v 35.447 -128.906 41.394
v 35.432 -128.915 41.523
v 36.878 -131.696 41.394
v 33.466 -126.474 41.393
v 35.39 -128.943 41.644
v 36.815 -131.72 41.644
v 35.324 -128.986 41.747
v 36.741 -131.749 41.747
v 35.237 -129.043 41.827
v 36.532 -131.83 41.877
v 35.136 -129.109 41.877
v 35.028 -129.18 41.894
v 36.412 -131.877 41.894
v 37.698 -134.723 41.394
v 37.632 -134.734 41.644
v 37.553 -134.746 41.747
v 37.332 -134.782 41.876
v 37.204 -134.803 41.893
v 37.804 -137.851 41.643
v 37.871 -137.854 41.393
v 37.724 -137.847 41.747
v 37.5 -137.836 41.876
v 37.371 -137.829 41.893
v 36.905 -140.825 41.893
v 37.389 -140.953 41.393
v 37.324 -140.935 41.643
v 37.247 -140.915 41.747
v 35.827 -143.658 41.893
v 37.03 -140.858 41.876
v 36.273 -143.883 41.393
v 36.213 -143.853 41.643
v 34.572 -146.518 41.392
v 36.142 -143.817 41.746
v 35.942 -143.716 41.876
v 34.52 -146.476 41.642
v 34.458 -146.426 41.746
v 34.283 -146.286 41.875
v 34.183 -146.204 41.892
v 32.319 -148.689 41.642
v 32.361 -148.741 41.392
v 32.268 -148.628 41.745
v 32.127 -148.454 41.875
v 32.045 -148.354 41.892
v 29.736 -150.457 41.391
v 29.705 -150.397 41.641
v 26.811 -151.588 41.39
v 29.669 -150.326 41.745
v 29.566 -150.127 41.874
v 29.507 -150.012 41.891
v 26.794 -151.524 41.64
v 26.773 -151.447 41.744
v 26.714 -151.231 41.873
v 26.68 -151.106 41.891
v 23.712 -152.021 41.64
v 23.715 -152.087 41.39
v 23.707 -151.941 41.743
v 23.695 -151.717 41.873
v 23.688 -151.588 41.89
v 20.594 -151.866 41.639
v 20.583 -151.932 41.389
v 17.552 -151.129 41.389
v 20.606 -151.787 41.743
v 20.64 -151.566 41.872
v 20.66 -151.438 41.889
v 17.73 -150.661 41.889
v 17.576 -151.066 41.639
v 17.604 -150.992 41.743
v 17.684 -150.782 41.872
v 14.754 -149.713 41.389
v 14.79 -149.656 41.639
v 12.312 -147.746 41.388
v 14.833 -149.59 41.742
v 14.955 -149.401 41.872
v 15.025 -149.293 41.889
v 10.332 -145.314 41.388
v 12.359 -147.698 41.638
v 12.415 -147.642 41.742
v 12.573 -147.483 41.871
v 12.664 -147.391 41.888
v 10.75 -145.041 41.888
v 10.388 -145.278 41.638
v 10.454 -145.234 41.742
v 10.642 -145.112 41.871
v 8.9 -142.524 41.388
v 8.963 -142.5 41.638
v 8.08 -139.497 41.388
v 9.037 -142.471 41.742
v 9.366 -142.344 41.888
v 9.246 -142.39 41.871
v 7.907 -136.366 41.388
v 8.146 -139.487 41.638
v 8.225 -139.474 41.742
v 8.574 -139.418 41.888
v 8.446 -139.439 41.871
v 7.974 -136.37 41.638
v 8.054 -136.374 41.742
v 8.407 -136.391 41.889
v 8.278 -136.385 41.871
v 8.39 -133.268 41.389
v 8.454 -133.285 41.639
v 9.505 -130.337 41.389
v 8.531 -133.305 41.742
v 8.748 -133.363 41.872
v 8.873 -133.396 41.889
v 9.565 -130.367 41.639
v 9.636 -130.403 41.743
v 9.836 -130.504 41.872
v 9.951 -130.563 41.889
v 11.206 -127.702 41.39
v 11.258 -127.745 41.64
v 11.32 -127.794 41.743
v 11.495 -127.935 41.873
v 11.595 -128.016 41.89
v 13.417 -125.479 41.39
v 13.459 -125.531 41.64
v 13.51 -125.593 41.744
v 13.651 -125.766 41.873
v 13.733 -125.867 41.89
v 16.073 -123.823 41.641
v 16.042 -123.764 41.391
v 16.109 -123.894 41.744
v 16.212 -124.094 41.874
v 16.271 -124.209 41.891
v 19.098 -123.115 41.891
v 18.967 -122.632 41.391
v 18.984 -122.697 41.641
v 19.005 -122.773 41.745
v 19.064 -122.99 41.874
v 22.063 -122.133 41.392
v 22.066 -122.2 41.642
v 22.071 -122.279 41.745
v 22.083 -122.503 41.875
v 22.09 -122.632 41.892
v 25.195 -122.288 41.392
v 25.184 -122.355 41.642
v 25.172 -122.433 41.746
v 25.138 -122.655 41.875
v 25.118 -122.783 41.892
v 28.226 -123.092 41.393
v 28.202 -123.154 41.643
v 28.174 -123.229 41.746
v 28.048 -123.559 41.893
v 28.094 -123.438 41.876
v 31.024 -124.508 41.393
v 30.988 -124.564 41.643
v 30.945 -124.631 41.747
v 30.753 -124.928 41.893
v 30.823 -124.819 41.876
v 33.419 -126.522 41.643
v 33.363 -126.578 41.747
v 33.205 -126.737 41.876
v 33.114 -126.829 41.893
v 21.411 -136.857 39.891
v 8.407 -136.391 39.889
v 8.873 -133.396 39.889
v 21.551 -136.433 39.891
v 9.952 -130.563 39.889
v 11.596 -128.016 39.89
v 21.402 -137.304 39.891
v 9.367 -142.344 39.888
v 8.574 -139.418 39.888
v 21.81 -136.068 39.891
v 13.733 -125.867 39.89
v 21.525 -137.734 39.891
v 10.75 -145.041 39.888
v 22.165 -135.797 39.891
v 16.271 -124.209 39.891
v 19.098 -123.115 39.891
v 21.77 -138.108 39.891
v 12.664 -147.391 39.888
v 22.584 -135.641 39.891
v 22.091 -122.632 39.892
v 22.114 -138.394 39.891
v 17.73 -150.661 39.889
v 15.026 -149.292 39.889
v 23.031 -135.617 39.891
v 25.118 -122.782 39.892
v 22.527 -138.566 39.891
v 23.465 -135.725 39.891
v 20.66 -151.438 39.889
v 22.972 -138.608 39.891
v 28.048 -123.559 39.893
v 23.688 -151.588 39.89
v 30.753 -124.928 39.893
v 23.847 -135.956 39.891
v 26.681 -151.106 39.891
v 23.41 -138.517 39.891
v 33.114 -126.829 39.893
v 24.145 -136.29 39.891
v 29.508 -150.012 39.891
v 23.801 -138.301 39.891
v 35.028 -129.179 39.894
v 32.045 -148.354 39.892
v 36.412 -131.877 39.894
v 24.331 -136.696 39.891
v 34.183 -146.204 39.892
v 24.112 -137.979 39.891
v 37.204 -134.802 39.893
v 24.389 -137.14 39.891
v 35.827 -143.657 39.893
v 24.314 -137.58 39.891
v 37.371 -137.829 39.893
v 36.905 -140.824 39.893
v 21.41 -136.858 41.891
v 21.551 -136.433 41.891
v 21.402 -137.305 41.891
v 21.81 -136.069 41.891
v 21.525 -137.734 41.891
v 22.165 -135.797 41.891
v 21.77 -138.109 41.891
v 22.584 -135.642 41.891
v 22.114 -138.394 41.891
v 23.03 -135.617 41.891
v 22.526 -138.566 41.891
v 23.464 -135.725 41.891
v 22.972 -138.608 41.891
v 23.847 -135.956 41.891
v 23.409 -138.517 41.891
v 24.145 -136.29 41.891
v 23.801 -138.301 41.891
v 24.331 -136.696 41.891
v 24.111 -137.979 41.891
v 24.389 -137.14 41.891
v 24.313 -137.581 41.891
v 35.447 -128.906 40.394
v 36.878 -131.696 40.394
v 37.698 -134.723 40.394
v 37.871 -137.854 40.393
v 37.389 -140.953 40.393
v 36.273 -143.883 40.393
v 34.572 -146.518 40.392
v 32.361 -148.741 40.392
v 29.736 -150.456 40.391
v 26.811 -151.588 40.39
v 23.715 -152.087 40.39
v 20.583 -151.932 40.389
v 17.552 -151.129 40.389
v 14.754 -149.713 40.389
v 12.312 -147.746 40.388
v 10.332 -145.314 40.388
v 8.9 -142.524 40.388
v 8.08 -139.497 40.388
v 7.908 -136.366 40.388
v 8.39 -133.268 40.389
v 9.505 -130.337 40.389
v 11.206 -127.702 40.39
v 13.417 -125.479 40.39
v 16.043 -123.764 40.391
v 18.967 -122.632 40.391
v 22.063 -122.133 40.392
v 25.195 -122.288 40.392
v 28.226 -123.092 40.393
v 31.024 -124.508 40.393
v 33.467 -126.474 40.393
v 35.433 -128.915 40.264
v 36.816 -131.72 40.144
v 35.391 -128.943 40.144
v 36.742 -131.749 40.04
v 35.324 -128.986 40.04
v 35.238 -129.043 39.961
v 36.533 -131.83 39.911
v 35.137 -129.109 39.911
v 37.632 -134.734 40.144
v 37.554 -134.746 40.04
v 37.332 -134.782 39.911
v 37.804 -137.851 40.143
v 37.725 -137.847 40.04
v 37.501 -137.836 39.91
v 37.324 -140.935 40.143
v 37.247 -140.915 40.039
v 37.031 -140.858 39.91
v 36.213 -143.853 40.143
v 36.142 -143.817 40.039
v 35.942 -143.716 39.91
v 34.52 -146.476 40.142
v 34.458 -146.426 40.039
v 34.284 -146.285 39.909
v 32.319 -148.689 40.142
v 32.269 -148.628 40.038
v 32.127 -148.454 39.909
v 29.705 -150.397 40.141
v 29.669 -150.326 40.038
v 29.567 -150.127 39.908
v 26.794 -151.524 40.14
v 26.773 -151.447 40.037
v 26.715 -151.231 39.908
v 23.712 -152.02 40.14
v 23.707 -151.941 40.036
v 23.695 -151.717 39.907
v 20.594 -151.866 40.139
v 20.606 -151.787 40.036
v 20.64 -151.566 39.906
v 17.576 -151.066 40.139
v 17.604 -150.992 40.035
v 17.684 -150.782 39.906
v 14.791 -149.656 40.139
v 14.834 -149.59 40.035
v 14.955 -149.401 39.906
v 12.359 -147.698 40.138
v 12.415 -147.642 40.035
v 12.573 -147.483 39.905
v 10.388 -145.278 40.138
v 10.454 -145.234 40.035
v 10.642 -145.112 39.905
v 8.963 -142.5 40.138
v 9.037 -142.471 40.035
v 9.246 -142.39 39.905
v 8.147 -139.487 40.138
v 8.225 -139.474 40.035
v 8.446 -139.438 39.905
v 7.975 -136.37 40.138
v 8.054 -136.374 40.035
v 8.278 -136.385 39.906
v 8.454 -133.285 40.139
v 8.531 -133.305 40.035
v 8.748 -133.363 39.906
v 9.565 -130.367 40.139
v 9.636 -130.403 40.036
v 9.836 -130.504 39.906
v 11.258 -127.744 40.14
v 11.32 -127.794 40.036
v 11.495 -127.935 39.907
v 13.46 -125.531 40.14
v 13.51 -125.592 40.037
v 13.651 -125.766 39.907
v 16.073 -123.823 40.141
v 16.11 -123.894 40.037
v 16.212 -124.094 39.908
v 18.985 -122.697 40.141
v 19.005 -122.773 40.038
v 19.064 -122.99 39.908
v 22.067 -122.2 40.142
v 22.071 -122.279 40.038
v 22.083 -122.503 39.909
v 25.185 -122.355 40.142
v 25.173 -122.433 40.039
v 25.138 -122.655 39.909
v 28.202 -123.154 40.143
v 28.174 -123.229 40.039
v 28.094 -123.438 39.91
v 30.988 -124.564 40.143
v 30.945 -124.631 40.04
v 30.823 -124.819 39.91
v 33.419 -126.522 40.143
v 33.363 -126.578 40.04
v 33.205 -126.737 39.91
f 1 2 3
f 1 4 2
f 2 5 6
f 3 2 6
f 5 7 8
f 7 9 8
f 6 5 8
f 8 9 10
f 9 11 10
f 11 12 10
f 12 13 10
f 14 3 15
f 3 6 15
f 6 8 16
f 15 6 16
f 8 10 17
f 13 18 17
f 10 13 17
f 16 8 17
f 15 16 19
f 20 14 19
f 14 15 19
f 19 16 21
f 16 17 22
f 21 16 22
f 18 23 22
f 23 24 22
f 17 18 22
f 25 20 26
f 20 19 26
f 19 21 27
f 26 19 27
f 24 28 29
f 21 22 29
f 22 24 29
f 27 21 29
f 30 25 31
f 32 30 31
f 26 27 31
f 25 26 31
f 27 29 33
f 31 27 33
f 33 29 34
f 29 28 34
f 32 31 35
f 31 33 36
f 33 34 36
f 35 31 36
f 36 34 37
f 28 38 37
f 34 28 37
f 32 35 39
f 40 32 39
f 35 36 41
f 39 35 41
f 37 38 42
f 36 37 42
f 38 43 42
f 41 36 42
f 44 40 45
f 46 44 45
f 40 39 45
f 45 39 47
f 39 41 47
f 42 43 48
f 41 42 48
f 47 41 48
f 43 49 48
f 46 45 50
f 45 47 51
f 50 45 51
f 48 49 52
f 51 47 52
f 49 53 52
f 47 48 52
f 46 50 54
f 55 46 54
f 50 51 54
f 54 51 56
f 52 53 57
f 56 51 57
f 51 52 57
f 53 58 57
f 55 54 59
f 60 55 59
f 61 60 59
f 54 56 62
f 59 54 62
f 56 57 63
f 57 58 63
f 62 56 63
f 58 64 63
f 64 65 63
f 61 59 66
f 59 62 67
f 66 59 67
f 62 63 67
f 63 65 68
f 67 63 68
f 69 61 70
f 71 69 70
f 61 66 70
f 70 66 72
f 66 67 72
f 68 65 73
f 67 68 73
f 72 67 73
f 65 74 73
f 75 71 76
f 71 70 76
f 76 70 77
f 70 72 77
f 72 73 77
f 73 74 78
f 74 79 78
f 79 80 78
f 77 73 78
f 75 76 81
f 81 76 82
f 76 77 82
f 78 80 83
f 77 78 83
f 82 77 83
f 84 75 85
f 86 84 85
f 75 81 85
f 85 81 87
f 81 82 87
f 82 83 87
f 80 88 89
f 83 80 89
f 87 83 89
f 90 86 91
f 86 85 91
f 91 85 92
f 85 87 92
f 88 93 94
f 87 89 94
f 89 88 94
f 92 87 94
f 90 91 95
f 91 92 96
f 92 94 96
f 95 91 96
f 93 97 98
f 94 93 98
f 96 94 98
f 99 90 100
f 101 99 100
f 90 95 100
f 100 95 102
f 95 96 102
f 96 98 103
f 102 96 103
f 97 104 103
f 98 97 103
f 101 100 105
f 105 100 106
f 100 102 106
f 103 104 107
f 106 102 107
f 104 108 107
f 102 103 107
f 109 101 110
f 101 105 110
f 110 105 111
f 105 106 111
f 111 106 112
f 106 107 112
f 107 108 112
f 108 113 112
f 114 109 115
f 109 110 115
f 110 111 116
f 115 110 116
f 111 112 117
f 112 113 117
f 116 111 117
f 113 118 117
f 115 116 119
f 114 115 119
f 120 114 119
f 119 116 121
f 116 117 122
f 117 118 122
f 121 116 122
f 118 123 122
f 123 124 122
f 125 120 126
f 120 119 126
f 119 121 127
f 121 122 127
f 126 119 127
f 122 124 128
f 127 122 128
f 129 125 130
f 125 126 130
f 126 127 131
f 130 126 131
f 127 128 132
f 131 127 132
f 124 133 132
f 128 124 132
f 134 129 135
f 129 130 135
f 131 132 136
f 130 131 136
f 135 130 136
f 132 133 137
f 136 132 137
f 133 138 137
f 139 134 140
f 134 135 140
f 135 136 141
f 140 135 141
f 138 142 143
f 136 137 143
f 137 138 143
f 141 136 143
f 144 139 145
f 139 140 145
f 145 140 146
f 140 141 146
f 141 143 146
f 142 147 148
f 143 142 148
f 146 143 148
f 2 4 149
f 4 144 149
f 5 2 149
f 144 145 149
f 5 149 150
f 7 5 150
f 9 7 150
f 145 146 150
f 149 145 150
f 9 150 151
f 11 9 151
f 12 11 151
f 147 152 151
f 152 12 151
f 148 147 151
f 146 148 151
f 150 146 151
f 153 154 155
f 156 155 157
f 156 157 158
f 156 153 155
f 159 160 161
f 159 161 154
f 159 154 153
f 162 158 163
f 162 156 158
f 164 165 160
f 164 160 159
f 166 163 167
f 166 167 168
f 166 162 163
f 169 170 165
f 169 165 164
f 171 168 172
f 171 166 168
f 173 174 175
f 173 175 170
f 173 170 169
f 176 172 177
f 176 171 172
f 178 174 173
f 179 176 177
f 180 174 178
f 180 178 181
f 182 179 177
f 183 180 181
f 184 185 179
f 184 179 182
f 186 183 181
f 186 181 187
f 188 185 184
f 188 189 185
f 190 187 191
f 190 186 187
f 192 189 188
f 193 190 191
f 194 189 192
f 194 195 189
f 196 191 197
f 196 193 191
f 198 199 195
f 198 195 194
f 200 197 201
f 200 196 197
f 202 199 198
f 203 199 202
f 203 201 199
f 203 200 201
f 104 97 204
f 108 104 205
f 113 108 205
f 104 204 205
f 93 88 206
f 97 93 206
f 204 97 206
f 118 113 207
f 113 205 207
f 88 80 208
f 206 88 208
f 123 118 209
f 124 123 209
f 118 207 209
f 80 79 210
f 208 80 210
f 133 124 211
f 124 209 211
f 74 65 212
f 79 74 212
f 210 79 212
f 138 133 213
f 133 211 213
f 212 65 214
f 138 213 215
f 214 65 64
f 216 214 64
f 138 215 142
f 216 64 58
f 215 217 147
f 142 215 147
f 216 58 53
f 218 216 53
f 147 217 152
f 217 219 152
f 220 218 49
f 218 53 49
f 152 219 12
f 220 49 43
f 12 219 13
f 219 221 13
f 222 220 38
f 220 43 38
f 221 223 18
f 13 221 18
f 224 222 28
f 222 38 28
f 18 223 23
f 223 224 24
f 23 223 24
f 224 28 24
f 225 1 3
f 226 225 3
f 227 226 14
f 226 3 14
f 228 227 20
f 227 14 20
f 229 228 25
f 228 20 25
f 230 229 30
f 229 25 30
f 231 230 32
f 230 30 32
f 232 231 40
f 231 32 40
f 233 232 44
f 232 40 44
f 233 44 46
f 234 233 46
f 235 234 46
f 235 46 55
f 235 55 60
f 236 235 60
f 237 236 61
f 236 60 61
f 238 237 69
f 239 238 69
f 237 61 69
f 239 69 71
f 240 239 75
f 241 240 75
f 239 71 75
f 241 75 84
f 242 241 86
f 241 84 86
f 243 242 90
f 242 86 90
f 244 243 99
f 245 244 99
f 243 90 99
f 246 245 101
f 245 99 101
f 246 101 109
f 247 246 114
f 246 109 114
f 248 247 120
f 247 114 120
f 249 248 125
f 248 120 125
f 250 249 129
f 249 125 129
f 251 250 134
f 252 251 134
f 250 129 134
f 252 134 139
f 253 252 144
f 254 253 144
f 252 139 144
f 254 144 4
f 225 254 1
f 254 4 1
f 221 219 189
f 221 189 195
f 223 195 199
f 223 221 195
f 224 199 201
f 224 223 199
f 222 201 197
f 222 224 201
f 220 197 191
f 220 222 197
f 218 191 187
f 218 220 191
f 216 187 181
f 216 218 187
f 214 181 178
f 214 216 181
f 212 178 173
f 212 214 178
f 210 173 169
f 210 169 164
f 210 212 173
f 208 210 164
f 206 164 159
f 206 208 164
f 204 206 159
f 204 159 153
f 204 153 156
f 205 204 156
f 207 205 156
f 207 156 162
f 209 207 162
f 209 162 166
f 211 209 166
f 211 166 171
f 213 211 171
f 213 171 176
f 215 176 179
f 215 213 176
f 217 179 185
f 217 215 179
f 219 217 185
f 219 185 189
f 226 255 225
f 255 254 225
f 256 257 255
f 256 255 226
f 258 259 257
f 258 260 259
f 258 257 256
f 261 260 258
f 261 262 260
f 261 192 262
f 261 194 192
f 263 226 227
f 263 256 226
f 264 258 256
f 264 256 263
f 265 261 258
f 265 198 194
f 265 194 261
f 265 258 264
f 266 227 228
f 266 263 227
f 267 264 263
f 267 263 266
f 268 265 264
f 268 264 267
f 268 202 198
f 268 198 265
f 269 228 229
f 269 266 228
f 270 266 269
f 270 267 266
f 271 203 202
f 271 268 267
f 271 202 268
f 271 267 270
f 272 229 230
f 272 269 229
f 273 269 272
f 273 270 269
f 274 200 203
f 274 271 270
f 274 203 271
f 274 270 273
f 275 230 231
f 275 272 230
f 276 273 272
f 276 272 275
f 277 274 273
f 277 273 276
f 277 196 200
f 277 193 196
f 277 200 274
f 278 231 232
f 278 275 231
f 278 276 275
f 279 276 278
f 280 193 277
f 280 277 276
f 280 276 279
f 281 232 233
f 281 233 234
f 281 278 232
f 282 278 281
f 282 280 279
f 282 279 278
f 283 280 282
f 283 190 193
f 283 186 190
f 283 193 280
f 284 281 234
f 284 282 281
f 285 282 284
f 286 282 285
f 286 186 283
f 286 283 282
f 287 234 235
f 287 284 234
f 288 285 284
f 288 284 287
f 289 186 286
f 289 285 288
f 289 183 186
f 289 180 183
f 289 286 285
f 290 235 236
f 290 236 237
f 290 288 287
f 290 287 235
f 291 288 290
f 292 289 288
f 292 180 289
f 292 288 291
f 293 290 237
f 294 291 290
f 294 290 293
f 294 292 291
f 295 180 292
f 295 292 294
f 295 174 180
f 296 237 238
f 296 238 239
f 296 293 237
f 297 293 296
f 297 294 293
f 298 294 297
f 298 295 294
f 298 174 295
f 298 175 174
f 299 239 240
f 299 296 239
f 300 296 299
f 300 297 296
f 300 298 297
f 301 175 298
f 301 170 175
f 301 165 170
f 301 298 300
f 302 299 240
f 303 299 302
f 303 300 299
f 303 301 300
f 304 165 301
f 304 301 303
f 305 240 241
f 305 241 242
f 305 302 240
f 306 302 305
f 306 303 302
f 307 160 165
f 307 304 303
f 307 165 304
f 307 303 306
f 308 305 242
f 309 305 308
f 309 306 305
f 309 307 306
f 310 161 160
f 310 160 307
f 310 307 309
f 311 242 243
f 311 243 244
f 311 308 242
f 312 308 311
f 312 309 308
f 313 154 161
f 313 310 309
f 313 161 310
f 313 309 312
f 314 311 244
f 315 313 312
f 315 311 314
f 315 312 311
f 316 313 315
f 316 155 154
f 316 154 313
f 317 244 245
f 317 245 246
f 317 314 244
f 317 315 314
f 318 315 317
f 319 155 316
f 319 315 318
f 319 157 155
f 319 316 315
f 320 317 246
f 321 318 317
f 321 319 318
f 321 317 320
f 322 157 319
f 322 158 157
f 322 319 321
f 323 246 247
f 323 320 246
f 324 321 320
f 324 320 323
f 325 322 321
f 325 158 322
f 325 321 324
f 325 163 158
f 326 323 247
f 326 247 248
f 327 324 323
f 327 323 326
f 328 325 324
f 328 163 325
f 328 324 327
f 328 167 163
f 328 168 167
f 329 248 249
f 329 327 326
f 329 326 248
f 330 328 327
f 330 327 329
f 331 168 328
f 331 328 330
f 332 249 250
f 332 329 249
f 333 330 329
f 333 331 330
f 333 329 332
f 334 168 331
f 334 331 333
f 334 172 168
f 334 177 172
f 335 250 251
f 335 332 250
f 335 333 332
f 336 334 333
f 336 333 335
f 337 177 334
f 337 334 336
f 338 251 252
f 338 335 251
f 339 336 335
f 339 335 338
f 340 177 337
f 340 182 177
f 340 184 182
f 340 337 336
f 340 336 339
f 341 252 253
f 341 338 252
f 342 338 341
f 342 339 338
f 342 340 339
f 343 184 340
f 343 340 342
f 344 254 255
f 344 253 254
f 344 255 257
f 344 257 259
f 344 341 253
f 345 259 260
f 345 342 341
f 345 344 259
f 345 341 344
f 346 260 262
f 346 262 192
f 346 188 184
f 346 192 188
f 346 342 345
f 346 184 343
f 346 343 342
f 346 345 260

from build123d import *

# Parameters (mm, degrees)
SKETCH2_R           = 15
SKETCH2_R_2         = 1.5
BOSS_EXTRUDE1_DEPTH = 2
FILLET1_R           = 0.5
FILLET3_R           = 0.5


with BuildPart() as part:
    # Sketch2 → Boss-Extrude1 (new body)
    with BuildSketch(Plane(origin=(-0.007077674, -0.003066892, 41.897062416), x_dir=(0.837169553, 0.546943422, 0.00018146), z_dir=(0.00016893, 7.3201e-05, -0.999999983))):
        with Locations((-55.821998493, 127.304785363)):
            Circle(SKETCH2_R)
        with Locations((-55.821998493, 127.304785363)):
            Circle(SKETCH2_R_2, mode=Mode.SUBTRACT)
    extrude(amount=BOSS_EXTRUDE1_DEPTH)

    # Fillet1
    fillet1_edges = [part.edges().sort_by_distance(p)[0] for p in [
        (10.331416884, -145.31438544, 41.888172015),
    ]]
    fillet(fillet1_edges, radius=FILLET1_R)

    # Fillet3
    fillet3_edges = [part.edges().sort_by_distance(p)[0] for p in [
        (10.331754744, -145.314239039, 39.888172049),
    ]]
    fillet(fillet3_edges, radius=FILLET3_R)


solid = part.part
